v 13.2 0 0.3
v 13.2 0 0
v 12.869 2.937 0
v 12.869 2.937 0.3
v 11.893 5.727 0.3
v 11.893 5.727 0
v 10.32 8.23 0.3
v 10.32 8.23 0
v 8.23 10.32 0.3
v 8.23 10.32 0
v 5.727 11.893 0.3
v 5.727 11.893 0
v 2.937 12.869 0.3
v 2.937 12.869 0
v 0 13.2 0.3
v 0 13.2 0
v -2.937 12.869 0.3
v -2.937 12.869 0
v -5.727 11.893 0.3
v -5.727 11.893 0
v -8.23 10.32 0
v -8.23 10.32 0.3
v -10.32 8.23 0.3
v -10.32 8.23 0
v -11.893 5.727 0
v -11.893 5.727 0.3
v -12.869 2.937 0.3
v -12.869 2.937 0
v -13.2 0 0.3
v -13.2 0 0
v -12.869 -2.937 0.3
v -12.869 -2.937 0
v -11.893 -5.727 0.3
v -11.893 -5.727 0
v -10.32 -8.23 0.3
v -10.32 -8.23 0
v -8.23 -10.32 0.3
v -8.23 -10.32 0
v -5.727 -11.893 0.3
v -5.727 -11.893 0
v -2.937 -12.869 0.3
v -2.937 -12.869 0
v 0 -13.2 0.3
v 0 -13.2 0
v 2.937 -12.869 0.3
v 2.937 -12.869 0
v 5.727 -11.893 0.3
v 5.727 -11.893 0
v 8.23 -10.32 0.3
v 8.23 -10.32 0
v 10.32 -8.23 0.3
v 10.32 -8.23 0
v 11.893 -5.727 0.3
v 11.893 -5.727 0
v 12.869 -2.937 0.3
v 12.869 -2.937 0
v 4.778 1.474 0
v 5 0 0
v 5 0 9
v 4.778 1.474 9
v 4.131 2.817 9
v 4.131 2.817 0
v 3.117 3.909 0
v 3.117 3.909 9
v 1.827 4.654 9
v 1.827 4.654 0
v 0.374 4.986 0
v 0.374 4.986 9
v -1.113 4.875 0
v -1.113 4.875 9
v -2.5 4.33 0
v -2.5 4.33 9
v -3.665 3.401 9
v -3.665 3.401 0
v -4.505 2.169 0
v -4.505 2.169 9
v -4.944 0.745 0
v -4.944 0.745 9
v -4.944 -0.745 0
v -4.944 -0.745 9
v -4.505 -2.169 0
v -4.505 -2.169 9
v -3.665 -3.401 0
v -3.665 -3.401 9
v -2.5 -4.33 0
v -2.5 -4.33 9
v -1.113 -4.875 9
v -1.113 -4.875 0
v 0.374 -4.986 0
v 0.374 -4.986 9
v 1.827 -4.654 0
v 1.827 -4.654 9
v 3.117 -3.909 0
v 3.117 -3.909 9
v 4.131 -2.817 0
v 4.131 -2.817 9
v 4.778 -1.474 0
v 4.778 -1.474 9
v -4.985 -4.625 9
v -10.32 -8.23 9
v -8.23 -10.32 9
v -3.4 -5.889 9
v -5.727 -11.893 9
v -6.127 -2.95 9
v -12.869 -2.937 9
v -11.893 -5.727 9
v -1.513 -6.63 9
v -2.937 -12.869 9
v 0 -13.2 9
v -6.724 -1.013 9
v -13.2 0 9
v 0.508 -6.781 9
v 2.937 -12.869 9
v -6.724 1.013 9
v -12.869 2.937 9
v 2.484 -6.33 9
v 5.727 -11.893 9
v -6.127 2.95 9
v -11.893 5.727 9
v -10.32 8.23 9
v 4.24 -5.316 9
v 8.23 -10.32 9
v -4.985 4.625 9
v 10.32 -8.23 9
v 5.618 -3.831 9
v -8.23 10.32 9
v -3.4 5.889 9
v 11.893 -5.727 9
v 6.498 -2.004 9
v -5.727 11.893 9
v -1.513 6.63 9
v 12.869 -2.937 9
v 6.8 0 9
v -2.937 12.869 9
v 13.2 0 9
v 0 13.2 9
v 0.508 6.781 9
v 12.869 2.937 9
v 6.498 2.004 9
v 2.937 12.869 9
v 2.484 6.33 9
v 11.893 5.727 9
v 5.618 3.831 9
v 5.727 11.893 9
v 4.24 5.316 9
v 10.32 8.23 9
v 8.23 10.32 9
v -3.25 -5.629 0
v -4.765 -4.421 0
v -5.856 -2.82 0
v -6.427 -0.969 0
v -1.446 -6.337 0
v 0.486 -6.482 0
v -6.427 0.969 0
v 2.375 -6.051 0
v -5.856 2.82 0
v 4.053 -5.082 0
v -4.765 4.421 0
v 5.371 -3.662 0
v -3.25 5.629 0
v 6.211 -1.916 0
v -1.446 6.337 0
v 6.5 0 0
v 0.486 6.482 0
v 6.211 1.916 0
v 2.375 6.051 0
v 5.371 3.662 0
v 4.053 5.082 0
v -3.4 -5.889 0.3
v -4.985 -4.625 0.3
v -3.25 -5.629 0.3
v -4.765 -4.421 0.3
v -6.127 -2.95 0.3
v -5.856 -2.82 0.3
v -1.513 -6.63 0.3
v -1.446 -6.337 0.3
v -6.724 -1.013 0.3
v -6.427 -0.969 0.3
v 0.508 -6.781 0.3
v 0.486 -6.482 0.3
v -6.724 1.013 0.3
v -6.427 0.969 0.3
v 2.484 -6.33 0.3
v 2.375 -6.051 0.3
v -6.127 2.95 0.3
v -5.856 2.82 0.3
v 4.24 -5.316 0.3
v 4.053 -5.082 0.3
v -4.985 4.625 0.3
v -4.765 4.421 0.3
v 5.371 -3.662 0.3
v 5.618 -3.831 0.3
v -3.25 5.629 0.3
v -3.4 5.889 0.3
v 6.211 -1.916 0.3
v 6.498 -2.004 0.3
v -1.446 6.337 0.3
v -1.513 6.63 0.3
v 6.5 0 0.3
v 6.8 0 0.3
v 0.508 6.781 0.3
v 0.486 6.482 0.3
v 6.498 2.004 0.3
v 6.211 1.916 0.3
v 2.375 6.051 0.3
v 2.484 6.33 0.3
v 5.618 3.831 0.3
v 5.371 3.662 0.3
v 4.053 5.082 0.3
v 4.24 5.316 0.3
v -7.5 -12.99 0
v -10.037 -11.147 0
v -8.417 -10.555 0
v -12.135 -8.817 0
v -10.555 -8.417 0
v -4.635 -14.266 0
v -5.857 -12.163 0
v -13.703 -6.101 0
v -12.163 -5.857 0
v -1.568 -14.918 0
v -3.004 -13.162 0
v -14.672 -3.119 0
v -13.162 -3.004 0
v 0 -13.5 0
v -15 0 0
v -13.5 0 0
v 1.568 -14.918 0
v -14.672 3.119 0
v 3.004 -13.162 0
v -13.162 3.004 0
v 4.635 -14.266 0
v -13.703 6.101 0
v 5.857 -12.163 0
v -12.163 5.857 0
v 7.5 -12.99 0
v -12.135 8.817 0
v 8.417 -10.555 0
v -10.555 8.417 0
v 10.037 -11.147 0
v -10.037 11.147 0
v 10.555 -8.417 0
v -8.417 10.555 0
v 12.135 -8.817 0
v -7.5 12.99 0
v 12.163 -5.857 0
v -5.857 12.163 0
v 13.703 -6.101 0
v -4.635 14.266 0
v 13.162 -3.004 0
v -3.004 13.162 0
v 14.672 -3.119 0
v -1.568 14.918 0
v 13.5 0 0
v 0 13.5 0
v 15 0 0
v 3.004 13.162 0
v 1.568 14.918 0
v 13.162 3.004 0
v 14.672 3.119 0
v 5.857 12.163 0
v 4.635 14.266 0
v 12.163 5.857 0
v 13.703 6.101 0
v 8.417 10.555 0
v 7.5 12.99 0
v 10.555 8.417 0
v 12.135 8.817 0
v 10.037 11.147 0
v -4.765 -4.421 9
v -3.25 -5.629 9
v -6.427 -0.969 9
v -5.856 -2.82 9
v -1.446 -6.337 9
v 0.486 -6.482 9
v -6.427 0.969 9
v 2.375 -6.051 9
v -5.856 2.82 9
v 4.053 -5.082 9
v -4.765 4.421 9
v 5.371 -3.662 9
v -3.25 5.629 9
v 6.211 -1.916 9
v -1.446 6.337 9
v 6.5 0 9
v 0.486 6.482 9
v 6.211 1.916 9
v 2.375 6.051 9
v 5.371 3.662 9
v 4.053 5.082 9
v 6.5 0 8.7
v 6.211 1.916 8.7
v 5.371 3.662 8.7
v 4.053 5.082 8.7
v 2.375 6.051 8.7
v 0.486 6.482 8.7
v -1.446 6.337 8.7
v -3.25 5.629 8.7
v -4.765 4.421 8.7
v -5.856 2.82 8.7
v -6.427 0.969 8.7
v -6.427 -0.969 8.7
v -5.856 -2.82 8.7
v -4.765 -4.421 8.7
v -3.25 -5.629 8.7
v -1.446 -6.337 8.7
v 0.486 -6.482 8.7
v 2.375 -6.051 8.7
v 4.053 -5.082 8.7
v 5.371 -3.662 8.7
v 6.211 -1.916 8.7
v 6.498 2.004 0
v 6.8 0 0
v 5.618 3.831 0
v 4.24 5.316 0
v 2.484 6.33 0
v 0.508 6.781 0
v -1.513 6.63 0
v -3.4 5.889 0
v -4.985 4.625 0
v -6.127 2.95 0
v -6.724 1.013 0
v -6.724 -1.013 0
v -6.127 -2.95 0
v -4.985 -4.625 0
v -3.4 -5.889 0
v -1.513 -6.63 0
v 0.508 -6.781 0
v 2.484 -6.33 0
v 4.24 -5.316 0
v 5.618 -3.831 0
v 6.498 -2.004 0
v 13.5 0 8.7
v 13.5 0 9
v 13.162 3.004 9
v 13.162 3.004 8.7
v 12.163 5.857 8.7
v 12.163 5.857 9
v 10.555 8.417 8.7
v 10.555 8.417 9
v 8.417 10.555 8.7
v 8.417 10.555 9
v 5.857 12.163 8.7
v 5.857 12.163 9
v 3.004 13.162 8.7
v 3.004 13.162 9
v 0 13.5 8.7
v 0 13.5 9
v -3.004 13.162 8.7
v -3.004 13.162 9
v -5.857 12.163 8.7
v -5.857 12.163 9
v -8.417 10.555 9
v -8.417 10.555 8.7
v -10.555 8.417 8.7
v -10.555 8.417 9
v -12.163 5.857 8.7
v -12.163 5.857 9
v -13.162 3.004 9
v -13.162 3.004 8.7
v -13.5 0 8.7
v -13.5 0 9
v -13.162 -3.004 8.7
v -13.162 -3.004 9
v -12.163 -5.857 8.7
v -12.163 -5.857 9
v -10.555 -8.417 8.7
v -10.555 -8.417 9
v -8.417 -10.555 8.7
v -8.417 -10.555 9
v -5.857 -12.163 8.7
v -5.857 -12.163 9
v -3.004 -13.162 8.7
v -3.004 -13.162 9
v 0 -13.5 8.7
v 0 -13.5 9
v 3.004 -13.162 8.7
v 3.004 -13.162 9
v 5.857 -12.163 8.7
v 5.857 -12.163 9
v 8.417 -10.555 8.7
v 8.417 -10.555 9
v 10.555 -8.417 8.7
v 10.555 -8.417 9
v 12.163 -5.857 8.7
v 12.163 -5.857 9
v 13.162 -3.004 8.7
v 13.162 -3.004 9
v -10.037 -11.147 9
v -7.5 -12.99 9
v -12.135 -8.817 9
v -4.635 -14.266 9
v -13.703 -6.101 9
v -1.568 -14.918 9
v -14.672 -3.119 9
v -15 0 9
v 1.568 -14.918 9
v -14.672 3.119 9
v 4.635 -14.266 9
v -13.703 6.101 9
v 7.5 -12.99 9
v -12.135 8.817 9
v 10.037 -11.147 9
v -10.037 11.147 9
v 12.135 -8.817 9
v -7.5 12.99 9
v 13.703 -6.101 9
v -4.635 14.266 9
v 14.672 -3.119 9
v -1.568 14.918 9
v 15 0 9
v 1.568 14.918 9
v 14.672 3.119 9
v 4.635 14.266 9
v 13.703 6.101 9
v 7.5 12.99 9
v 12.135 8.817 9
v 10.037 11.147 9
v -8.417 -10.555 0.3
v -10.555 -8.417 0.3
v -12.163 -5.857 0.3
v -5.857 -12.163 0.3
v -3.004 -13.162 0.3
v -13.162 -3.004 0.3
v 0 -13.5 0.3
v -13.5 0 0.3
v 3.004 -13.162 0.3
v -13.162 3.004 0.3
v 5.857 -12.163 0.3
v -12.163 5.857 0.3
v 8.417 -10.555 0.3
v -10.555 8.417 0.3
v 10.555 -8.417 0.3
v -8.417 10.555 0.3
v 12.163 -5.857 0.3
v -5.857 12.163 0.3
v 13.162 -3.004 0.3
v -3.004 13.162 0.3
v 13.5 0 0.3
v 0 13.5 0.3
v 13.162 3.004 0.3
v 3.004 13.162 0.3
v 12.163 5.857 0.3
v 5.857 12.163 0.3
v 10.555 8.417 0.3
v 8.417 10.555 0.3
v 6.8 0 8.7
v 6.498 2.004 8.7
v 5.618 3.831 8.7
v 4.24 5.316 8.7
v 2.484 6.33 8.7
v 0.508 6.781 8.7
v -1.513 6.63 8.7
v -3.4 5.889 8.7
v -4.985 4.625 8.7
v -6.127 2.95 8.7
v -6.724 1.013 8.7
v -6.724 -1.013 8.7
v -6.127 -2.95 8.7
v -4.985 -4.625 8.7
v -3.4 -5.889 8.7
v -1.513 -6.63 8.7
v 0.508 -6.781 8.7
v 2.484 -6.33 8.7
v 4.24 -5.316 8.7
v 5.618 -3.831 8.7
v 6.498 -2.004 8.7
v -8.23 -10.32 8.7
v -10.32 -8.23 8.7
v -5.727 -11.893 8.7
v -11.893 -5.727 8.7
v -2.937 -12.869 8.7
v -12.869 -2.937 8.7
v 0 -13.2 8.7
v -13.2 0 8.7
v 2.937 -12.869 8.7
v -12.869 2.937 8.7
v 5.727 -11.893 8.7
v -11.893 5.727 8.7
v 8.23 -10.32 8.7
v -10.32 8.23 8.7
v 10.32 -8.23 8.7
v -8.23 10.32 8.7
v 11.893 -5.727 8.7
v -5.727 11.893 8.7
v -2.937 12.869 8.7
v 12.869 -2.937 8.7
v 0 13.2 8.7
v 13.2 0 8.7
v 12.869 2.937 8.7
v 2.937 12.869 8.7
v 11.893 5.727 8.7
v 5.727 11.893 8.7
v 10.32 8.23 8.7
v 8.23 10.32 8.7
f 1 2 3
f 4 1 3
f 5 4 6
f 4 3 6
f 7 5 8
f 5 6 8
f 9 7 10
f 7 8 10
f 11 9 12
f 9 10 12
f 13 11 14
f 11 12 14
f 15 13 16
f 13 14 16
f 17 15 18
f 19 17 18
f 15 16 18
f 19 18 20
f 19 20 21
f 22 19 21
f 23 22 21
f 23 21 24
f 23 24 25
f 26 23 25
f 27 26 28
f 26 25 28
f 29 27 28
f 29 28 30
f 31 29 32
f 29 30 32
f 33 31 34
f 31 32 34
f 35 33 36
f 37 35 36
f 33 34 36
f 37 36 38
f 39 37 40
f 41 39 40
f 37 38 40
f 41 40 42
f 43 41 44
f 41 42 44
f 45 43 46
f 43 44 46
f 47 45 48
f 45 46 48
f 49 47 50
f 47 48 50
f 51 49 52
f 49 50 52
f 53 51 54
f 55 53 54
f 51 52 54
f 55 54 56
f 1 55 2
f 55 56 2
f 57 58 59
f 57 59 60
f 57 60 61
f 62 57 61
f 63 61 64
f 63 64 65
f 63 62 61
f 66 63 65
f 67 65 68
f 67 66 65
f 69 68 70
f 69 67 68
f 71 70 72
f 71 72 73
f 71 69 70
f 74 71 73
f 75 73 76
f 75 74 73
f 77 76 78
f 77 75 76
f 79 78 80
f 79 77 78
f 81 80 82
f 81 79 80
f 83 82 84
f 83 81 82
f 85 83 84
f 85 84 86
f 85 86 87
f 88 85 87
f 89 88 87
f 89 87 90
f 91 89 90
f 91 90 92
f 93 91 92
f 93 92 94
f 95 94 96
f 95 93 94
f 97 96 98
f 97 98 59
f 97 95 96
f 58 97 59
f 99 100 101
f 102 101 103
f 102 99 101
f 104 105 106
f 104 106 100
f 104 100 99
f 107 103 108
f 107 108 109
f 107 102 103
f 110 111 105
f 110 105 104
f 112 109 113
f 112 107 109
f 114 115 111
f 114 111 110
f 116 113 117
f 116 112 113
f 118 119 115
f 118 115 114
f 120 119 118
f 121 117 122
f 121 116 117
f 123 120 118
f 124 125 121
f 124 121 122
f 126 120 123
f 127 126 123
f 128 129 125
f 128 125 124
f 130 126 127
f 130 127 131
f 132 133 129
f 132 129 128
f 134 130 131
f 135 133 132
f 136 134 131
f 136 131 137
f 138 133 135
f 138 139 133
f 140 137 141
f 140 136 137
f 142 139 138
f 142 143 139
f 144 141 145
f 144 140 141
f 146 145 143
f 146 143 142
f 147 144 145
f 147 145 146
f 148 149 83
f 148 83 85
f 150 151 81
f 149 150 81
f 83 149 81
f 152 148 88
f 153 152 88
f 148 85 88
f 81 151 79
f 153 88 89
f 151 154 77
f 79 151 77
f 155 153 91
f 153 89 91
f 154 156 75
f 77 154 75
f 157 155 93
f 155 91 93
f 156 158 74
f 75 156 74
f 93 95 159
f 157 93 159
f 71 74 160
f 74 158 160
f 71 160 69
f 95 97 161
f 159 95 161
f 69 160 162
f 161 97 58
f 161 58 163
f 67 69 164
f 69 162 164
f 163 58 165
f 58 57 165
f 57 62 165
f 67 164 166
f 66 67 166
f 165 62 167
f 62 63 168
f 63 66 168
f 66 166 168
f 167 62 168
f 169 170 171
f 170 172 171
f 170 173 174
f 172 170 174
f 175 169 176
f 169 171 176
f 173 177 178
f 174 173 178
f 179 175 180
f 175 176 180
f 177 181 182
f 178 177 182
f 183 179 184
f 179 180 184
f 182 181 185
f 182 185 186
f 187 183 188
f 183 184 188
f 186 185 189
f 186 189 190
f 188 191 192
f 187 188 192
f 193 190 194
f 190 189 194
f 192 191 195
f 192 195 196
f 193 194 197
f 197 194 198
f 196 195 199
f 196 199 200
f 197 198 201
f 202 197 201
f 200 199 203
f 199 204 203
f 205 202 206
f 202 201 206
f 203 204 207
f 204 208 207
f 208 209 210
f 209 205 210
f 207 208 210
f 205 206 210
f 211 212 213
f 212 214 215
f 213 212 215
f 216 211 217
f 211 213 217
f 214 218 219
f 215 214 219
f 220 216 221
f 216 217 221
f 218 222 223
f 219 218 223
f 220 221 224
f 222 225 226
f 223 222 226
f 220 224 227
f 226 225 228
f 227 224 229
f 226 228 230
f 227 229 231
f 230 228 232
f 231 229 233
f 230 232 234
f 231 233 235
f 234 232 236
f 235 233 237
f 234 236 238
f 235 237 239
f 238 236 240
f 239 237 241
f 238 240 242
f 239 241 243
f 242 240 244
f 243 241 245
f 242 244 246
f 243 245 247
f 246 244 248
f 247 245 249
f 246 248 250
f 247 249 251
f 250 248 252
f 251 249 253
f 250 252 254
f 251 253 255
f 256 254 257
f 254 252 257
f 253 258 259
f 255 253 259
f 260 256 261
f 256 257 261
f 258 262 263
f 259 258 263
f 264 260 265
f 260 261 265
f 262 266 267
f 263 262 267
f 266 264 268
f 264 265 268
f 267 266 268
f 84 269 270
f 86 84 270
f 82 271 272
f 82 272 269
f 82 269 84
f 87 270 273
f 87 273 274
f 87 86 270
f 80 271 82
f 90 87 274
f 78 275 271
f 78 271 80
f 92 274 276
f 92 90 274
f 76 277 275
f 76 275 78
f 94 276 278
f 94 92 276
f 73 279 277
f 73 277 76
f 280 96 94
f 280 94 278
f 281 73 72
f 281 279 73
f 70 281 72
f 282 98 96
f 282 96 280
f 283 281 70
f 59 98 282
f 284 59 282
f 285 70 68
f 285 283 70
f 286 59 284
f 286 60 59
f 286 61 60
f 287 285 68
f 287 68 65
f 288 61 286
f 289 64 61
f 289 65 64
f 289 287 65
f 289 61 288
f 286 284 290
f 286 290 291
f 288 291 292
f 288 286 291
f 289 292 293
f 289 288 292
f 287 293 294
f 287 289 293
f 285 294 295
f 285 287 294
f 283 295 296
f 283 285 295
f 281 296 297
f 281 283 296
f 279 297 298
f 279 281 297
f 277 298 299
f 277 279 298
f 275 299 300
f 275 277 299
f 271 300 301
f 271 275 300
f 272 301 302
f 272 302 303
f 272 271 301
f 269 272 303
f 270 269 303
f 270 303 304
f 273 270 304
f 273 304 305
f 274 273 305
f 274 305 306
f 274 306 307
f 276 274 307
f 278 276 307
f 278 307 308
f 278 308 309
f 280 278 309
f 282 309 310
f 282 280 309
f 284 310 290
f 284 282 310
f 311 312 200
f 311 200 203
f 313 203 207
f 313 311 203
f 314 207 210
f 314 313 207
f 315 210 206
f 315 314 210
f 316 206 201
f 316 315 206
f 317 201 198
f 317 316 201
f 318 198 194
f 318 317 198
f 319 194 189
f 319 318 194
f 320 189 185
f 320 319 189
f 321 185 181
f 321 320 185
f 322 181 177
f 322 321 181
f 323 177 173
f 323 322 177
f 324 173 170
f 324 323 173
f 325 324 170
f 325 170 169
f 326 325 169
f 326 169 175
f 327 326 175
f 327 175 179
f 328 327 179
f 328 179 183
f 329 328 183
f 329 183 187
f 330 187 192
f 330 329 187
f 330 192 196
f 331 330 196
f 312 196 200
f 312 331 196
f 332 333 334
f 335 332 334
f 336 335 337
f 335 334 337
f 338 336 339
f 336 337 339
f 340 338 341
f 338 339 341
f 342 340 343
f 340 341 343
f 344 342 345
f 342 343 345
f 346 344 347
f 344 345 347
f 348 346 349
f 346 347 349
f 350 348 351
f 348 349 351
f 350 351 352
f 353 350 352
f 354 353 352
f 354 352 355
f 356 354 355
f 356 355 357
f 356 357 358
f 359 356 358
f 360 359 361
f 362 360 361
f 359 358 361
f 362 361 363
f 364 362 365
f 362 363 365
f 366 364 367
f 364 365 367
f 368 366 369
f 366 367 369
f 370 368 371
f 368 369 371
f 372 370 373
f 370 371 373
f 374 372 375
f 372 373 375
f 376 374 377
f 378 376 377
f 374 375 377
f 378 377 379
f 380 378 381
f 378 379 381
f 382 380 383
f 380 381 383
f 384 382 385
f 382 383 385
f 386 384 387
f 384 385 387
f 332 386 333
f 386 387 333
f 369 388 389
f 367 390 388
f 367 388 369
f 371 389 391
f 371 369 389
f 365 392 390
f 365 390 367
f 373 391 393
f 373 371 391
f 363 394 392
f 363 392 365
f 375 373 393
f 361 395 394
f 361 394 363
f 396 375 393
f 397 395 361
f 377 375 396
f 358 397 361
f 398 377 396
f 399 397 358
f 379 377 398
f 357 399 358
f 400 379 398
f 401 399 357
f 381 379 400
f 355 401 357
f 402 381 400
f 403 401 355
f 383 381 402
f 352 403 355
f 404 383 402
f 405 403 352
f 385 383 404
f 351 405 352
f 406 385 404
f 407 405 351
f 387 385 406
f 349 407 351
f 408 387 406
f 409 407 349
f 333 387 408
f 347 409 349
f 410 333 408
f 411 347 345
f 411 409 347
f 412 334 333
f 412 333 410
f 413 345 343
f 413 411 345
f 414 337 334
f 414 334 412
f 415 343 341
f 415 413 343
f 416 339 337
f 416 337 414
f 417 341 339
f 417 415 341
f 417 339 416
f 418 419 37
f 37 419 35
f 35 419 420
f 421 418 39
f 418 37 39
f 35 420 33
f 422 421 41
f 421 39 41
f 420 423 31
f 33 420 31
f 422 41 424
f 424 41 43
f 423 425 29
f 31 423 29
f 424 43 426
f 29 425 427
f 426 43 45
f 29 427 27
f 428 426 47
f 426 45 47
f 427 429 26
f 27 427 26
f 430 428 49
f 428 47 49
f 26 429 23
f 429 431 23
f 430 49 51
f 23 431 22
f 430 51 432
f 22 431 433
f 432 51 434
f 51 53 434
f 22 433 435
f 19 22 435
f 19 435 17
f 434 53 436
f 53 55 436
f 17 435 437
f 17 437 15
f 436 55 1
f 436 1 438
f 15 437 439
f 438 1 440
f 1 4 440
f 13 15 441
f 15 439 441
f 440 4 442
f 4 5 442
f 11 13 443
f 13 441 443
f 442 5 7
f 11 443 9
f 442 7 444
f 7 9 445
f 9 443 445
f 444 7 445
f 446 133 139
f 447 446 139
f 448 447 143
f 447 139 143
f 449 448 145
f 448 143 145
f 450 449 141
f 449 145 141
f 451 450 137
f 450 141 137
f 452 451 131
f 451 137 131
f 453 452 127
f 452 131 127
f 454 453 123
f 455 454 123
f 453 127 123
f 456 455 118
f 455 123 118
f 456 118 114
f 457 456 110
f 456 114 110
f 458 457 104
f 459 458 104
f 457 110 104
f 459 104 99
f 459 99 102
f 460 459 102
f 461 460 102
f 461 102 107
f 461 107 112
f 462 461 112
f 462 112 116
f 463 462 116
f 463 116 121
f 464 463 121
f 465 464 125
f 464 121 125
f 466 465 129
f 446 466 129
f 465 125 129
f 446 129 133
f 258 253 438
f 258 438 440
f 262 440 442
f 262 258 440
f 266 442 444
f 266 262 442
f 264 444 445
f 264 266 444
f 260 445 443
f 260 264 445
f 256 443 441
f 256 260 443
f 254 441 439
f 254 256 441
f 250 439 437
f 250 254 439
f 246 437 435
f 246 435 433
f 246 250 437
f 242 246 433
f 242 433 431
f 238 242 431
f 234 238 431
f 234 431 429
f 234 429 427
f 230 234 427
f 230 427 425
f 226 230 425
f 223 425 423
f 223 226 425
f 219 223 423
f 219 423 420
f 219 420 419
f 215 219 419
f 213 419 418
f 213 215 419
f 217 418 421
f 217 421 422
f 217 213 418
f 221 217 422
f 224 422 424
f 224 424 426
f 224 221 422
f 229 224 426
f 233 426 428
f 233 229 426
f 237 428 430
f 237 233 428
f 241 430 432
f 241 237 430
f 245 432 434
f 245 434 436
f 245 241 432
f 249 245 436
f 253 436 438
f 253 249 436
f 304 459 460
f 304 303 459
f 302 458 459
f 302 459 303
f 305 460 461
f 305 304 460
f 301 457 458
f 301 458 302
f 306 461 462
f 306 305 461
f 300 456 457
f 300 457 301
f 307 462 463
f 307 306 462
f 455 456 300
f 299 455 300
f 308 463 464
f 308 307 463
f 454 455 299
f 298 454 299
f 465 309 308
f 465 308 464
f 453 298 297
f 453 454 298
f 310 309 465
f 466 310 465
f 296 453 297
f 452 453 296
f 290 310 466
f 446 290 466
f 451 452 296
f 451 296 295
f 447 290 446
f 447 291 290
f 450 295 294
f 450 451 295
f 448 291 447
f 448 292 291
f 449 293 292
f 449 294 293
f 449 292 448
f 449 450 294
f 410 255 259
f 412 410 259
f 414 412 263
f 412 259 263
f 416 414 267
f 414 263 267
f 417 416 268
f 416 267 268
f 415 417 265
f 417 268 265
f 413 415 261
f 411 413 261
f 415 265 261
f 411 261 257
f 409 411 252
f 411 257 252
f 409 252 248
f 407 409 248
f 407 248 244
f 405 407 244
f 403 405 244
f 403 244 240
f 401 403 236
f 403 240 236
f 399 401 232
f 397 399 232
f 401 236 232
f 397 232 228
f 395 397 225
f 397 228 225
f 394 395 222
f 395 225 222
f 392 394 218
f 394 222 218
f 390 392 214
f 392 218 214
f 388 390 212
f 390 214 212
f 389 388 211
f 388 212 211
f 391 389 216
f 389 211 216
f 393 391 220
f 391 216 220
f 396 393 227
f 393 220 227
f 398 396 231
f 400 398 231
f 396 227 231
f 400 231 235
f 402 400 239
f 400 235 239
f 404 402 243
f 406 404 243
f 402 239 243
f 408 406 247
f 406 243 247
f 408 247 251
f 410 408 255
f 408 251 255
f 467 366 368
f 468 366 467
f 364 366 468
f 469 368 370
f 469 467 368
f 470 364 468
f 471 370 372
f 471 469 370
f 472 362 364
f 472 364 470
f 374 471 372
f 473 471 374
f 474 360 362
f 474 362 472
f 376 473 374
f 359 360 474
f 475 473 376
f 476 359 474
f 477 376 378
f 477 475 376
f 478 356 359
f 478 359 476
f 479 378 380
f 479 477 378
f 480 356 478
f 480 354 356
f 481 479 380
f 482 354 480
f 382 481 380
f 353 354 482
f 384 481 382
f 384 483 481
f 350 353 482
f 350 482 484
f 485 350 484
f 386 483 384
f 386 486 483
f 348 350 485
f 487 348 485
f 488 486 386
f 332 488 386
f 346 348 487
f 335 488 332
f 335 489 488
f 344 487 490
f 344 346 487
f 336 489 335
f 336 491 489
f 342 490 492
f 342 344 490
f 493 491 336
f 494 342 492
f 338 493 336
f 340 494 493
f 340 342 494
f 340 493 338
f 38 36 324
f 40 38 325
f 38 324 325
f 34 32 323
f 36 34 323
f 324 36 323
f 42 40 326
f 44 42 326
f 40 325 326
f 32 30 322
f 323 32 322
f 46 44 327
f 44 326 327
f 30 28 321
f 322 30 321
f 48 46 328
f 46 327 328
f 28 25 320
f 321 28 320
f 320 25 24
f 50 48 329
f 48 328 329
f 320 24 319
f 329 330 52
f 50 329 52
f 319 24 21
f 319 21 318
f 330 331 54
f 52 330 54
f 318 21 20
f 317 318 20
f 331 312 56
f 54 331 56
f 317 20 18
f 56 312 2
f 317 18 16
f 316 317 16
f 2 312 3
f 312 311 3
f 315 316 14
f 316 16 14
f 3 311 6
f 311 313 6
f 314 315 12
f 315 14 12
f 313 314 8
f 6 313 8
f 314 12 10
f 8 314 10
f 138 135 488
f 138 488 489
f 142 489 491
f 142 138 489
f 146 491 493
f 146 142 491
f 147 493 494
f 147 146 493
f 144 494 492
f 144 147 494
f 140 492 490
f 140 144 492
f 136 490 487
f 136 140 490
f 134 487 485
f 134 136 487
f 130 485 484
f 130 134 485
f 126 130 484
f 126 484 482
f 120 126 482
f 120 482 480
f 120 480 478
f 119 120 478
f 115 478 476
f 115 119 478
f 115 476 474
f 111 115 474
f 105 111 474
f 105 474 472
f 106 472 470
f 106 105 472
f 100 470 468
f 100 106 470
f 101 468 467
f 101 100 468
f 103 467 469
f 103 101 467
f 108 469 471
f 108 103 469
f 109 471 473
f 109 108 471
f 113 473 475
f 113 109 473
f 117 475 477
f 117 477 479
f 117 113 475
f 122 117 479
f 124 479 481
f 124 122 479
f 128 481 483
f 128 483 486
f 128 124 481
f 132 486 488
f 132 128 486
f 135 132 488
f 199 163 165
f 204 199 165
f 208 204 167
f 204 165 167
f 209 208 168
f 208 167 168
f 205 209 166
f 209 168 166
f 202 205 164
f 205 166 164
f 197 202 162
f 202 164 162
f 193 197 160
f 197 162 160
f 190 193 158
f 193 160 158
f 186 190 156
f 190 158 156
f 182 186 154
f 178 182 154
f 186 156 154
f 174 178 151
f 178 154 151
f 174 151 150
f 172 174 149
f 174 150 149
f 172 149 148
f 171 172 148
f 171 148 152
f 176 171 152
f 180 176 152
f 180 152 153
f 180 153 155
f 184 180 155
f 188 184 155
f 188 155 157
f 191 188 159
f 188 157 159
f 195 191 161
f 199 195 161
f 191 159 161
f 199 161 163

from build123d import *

# Parameters (mm, degrees)
CROQUIS1_R              = 15
CROQUIS1_R_2            = 5
SALIENTE_EXTRUIR1_DEPTH = 9
CROQUIS2_R              = 13.5
CROQUIS2_R_2            = 13.2
CROQUIS2_R_3            = 6.8
CROQUIS2_R_4            = 6.5
CORTAR_EXTRUIR1_DEPTH   = 0.3


with BuildPart() as part:
    # Croquis1 → Saliente-Extruir1 (new body)
    with BuildSketch(Plane.XY):
        Circle(CROQUIS1_R)
        Circle(CROQUIS1_R_2, mode=Mode.SUBTRACT)
    extrude(amount=SALIENTE_EXTRUIR1_DEPTH)

    # Croquis2 → Cortar-Extruir1 (cut)
    with BuildSketch(Plane.XY.offset(9)):
        Circle(CROQUIS2_R)
        Circle(CROQUIS2_R_2, mode=Mode.SUBTRACT)
        Circle(CROQUIS2_R_3)
        Circle(CROQUIS2_R_4, mode=Mode.SUBTRACT)
    cortar_extruir1 = extrude(amount=-CORTAR_EXTRUIR1_DEPTH, mode=Mode.SUBTRACT)

    # Simetría1: Cortar-Extruir1 across plane
    add(cortar_extruir1.mirror(Plane.XY.offset(4.5)), mode=Mode.SUBTRACT)


solid = part.part
